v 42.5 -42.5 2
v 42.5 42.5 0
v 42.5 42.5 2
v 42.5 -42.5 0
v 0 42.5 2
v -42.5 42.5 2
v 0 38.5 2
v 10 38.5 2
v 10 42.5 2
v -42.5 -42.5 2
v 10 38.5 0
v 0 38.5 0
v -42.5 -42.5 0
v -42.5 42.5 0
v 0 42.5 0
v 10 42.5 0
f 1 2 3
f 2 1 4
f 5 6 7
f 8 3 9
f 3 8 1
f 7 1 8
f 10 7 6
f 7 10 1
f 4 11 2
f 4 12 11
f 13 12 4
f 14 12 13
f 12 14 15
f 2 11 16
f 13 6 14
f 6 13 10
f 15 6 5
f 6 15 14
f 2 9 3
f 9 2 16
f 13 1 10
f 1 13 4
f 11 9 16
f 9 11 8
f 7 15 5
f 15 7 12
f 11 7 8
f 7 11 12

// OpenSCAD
// Sowing template for 90 mm Petri dish
// Flat disc with grid of holes and orientation notch.

$fn = 64;

// Dimensions
DISH_DIA = 90;
DISC_DIA = 85;
THICKNESS = 2;
HOLE_COUNT = 7;
HOLE_DIA = 3;
HOLE_SPACING = 9;
NOTCH_WIDTH = 10;
NOTCH_DEPTH = 4;

// Calculate grid positions
// n features spaced p apart and centred on the origin sit at (i - (n - 1) / 2) * p
grid_offset = (HOLE_COUNT - 1) / 2 * HOLE_SPACING;

difference() {
    // Main disc body
    translate([-DISC_DIA / 2, -DISC_DIA / 2, 0])
        cube([DISC_DIA, DISC_DIA, THICKNESS]);

    // Grid of holes
    for (i = [0 : HOLE_COUNT - 1]) {
        x_pos = (i - grid_offset) * HOLE_SPACING;
        translate([x_pos, 0, -1])
            cylinder(h = THICKNESS + 2, d = HOLE_DIA);
    }

    // Orientation notch on the +Y side
    // Notch is 10 mm wide (X) and 4 mm deep (Y, measured in from the rim)
    // The disc radius is 42.5 mm. The notch starts at Y = 42.5 - 4 = 38.5 mm.
    // The notch extends from X = -5 to X = +5 mm.
    translate([0, 38.5, -1])
        cube([NOTCH_WIDTH, NOTCH_DEPTH, THICKNESS + 2]);
}
